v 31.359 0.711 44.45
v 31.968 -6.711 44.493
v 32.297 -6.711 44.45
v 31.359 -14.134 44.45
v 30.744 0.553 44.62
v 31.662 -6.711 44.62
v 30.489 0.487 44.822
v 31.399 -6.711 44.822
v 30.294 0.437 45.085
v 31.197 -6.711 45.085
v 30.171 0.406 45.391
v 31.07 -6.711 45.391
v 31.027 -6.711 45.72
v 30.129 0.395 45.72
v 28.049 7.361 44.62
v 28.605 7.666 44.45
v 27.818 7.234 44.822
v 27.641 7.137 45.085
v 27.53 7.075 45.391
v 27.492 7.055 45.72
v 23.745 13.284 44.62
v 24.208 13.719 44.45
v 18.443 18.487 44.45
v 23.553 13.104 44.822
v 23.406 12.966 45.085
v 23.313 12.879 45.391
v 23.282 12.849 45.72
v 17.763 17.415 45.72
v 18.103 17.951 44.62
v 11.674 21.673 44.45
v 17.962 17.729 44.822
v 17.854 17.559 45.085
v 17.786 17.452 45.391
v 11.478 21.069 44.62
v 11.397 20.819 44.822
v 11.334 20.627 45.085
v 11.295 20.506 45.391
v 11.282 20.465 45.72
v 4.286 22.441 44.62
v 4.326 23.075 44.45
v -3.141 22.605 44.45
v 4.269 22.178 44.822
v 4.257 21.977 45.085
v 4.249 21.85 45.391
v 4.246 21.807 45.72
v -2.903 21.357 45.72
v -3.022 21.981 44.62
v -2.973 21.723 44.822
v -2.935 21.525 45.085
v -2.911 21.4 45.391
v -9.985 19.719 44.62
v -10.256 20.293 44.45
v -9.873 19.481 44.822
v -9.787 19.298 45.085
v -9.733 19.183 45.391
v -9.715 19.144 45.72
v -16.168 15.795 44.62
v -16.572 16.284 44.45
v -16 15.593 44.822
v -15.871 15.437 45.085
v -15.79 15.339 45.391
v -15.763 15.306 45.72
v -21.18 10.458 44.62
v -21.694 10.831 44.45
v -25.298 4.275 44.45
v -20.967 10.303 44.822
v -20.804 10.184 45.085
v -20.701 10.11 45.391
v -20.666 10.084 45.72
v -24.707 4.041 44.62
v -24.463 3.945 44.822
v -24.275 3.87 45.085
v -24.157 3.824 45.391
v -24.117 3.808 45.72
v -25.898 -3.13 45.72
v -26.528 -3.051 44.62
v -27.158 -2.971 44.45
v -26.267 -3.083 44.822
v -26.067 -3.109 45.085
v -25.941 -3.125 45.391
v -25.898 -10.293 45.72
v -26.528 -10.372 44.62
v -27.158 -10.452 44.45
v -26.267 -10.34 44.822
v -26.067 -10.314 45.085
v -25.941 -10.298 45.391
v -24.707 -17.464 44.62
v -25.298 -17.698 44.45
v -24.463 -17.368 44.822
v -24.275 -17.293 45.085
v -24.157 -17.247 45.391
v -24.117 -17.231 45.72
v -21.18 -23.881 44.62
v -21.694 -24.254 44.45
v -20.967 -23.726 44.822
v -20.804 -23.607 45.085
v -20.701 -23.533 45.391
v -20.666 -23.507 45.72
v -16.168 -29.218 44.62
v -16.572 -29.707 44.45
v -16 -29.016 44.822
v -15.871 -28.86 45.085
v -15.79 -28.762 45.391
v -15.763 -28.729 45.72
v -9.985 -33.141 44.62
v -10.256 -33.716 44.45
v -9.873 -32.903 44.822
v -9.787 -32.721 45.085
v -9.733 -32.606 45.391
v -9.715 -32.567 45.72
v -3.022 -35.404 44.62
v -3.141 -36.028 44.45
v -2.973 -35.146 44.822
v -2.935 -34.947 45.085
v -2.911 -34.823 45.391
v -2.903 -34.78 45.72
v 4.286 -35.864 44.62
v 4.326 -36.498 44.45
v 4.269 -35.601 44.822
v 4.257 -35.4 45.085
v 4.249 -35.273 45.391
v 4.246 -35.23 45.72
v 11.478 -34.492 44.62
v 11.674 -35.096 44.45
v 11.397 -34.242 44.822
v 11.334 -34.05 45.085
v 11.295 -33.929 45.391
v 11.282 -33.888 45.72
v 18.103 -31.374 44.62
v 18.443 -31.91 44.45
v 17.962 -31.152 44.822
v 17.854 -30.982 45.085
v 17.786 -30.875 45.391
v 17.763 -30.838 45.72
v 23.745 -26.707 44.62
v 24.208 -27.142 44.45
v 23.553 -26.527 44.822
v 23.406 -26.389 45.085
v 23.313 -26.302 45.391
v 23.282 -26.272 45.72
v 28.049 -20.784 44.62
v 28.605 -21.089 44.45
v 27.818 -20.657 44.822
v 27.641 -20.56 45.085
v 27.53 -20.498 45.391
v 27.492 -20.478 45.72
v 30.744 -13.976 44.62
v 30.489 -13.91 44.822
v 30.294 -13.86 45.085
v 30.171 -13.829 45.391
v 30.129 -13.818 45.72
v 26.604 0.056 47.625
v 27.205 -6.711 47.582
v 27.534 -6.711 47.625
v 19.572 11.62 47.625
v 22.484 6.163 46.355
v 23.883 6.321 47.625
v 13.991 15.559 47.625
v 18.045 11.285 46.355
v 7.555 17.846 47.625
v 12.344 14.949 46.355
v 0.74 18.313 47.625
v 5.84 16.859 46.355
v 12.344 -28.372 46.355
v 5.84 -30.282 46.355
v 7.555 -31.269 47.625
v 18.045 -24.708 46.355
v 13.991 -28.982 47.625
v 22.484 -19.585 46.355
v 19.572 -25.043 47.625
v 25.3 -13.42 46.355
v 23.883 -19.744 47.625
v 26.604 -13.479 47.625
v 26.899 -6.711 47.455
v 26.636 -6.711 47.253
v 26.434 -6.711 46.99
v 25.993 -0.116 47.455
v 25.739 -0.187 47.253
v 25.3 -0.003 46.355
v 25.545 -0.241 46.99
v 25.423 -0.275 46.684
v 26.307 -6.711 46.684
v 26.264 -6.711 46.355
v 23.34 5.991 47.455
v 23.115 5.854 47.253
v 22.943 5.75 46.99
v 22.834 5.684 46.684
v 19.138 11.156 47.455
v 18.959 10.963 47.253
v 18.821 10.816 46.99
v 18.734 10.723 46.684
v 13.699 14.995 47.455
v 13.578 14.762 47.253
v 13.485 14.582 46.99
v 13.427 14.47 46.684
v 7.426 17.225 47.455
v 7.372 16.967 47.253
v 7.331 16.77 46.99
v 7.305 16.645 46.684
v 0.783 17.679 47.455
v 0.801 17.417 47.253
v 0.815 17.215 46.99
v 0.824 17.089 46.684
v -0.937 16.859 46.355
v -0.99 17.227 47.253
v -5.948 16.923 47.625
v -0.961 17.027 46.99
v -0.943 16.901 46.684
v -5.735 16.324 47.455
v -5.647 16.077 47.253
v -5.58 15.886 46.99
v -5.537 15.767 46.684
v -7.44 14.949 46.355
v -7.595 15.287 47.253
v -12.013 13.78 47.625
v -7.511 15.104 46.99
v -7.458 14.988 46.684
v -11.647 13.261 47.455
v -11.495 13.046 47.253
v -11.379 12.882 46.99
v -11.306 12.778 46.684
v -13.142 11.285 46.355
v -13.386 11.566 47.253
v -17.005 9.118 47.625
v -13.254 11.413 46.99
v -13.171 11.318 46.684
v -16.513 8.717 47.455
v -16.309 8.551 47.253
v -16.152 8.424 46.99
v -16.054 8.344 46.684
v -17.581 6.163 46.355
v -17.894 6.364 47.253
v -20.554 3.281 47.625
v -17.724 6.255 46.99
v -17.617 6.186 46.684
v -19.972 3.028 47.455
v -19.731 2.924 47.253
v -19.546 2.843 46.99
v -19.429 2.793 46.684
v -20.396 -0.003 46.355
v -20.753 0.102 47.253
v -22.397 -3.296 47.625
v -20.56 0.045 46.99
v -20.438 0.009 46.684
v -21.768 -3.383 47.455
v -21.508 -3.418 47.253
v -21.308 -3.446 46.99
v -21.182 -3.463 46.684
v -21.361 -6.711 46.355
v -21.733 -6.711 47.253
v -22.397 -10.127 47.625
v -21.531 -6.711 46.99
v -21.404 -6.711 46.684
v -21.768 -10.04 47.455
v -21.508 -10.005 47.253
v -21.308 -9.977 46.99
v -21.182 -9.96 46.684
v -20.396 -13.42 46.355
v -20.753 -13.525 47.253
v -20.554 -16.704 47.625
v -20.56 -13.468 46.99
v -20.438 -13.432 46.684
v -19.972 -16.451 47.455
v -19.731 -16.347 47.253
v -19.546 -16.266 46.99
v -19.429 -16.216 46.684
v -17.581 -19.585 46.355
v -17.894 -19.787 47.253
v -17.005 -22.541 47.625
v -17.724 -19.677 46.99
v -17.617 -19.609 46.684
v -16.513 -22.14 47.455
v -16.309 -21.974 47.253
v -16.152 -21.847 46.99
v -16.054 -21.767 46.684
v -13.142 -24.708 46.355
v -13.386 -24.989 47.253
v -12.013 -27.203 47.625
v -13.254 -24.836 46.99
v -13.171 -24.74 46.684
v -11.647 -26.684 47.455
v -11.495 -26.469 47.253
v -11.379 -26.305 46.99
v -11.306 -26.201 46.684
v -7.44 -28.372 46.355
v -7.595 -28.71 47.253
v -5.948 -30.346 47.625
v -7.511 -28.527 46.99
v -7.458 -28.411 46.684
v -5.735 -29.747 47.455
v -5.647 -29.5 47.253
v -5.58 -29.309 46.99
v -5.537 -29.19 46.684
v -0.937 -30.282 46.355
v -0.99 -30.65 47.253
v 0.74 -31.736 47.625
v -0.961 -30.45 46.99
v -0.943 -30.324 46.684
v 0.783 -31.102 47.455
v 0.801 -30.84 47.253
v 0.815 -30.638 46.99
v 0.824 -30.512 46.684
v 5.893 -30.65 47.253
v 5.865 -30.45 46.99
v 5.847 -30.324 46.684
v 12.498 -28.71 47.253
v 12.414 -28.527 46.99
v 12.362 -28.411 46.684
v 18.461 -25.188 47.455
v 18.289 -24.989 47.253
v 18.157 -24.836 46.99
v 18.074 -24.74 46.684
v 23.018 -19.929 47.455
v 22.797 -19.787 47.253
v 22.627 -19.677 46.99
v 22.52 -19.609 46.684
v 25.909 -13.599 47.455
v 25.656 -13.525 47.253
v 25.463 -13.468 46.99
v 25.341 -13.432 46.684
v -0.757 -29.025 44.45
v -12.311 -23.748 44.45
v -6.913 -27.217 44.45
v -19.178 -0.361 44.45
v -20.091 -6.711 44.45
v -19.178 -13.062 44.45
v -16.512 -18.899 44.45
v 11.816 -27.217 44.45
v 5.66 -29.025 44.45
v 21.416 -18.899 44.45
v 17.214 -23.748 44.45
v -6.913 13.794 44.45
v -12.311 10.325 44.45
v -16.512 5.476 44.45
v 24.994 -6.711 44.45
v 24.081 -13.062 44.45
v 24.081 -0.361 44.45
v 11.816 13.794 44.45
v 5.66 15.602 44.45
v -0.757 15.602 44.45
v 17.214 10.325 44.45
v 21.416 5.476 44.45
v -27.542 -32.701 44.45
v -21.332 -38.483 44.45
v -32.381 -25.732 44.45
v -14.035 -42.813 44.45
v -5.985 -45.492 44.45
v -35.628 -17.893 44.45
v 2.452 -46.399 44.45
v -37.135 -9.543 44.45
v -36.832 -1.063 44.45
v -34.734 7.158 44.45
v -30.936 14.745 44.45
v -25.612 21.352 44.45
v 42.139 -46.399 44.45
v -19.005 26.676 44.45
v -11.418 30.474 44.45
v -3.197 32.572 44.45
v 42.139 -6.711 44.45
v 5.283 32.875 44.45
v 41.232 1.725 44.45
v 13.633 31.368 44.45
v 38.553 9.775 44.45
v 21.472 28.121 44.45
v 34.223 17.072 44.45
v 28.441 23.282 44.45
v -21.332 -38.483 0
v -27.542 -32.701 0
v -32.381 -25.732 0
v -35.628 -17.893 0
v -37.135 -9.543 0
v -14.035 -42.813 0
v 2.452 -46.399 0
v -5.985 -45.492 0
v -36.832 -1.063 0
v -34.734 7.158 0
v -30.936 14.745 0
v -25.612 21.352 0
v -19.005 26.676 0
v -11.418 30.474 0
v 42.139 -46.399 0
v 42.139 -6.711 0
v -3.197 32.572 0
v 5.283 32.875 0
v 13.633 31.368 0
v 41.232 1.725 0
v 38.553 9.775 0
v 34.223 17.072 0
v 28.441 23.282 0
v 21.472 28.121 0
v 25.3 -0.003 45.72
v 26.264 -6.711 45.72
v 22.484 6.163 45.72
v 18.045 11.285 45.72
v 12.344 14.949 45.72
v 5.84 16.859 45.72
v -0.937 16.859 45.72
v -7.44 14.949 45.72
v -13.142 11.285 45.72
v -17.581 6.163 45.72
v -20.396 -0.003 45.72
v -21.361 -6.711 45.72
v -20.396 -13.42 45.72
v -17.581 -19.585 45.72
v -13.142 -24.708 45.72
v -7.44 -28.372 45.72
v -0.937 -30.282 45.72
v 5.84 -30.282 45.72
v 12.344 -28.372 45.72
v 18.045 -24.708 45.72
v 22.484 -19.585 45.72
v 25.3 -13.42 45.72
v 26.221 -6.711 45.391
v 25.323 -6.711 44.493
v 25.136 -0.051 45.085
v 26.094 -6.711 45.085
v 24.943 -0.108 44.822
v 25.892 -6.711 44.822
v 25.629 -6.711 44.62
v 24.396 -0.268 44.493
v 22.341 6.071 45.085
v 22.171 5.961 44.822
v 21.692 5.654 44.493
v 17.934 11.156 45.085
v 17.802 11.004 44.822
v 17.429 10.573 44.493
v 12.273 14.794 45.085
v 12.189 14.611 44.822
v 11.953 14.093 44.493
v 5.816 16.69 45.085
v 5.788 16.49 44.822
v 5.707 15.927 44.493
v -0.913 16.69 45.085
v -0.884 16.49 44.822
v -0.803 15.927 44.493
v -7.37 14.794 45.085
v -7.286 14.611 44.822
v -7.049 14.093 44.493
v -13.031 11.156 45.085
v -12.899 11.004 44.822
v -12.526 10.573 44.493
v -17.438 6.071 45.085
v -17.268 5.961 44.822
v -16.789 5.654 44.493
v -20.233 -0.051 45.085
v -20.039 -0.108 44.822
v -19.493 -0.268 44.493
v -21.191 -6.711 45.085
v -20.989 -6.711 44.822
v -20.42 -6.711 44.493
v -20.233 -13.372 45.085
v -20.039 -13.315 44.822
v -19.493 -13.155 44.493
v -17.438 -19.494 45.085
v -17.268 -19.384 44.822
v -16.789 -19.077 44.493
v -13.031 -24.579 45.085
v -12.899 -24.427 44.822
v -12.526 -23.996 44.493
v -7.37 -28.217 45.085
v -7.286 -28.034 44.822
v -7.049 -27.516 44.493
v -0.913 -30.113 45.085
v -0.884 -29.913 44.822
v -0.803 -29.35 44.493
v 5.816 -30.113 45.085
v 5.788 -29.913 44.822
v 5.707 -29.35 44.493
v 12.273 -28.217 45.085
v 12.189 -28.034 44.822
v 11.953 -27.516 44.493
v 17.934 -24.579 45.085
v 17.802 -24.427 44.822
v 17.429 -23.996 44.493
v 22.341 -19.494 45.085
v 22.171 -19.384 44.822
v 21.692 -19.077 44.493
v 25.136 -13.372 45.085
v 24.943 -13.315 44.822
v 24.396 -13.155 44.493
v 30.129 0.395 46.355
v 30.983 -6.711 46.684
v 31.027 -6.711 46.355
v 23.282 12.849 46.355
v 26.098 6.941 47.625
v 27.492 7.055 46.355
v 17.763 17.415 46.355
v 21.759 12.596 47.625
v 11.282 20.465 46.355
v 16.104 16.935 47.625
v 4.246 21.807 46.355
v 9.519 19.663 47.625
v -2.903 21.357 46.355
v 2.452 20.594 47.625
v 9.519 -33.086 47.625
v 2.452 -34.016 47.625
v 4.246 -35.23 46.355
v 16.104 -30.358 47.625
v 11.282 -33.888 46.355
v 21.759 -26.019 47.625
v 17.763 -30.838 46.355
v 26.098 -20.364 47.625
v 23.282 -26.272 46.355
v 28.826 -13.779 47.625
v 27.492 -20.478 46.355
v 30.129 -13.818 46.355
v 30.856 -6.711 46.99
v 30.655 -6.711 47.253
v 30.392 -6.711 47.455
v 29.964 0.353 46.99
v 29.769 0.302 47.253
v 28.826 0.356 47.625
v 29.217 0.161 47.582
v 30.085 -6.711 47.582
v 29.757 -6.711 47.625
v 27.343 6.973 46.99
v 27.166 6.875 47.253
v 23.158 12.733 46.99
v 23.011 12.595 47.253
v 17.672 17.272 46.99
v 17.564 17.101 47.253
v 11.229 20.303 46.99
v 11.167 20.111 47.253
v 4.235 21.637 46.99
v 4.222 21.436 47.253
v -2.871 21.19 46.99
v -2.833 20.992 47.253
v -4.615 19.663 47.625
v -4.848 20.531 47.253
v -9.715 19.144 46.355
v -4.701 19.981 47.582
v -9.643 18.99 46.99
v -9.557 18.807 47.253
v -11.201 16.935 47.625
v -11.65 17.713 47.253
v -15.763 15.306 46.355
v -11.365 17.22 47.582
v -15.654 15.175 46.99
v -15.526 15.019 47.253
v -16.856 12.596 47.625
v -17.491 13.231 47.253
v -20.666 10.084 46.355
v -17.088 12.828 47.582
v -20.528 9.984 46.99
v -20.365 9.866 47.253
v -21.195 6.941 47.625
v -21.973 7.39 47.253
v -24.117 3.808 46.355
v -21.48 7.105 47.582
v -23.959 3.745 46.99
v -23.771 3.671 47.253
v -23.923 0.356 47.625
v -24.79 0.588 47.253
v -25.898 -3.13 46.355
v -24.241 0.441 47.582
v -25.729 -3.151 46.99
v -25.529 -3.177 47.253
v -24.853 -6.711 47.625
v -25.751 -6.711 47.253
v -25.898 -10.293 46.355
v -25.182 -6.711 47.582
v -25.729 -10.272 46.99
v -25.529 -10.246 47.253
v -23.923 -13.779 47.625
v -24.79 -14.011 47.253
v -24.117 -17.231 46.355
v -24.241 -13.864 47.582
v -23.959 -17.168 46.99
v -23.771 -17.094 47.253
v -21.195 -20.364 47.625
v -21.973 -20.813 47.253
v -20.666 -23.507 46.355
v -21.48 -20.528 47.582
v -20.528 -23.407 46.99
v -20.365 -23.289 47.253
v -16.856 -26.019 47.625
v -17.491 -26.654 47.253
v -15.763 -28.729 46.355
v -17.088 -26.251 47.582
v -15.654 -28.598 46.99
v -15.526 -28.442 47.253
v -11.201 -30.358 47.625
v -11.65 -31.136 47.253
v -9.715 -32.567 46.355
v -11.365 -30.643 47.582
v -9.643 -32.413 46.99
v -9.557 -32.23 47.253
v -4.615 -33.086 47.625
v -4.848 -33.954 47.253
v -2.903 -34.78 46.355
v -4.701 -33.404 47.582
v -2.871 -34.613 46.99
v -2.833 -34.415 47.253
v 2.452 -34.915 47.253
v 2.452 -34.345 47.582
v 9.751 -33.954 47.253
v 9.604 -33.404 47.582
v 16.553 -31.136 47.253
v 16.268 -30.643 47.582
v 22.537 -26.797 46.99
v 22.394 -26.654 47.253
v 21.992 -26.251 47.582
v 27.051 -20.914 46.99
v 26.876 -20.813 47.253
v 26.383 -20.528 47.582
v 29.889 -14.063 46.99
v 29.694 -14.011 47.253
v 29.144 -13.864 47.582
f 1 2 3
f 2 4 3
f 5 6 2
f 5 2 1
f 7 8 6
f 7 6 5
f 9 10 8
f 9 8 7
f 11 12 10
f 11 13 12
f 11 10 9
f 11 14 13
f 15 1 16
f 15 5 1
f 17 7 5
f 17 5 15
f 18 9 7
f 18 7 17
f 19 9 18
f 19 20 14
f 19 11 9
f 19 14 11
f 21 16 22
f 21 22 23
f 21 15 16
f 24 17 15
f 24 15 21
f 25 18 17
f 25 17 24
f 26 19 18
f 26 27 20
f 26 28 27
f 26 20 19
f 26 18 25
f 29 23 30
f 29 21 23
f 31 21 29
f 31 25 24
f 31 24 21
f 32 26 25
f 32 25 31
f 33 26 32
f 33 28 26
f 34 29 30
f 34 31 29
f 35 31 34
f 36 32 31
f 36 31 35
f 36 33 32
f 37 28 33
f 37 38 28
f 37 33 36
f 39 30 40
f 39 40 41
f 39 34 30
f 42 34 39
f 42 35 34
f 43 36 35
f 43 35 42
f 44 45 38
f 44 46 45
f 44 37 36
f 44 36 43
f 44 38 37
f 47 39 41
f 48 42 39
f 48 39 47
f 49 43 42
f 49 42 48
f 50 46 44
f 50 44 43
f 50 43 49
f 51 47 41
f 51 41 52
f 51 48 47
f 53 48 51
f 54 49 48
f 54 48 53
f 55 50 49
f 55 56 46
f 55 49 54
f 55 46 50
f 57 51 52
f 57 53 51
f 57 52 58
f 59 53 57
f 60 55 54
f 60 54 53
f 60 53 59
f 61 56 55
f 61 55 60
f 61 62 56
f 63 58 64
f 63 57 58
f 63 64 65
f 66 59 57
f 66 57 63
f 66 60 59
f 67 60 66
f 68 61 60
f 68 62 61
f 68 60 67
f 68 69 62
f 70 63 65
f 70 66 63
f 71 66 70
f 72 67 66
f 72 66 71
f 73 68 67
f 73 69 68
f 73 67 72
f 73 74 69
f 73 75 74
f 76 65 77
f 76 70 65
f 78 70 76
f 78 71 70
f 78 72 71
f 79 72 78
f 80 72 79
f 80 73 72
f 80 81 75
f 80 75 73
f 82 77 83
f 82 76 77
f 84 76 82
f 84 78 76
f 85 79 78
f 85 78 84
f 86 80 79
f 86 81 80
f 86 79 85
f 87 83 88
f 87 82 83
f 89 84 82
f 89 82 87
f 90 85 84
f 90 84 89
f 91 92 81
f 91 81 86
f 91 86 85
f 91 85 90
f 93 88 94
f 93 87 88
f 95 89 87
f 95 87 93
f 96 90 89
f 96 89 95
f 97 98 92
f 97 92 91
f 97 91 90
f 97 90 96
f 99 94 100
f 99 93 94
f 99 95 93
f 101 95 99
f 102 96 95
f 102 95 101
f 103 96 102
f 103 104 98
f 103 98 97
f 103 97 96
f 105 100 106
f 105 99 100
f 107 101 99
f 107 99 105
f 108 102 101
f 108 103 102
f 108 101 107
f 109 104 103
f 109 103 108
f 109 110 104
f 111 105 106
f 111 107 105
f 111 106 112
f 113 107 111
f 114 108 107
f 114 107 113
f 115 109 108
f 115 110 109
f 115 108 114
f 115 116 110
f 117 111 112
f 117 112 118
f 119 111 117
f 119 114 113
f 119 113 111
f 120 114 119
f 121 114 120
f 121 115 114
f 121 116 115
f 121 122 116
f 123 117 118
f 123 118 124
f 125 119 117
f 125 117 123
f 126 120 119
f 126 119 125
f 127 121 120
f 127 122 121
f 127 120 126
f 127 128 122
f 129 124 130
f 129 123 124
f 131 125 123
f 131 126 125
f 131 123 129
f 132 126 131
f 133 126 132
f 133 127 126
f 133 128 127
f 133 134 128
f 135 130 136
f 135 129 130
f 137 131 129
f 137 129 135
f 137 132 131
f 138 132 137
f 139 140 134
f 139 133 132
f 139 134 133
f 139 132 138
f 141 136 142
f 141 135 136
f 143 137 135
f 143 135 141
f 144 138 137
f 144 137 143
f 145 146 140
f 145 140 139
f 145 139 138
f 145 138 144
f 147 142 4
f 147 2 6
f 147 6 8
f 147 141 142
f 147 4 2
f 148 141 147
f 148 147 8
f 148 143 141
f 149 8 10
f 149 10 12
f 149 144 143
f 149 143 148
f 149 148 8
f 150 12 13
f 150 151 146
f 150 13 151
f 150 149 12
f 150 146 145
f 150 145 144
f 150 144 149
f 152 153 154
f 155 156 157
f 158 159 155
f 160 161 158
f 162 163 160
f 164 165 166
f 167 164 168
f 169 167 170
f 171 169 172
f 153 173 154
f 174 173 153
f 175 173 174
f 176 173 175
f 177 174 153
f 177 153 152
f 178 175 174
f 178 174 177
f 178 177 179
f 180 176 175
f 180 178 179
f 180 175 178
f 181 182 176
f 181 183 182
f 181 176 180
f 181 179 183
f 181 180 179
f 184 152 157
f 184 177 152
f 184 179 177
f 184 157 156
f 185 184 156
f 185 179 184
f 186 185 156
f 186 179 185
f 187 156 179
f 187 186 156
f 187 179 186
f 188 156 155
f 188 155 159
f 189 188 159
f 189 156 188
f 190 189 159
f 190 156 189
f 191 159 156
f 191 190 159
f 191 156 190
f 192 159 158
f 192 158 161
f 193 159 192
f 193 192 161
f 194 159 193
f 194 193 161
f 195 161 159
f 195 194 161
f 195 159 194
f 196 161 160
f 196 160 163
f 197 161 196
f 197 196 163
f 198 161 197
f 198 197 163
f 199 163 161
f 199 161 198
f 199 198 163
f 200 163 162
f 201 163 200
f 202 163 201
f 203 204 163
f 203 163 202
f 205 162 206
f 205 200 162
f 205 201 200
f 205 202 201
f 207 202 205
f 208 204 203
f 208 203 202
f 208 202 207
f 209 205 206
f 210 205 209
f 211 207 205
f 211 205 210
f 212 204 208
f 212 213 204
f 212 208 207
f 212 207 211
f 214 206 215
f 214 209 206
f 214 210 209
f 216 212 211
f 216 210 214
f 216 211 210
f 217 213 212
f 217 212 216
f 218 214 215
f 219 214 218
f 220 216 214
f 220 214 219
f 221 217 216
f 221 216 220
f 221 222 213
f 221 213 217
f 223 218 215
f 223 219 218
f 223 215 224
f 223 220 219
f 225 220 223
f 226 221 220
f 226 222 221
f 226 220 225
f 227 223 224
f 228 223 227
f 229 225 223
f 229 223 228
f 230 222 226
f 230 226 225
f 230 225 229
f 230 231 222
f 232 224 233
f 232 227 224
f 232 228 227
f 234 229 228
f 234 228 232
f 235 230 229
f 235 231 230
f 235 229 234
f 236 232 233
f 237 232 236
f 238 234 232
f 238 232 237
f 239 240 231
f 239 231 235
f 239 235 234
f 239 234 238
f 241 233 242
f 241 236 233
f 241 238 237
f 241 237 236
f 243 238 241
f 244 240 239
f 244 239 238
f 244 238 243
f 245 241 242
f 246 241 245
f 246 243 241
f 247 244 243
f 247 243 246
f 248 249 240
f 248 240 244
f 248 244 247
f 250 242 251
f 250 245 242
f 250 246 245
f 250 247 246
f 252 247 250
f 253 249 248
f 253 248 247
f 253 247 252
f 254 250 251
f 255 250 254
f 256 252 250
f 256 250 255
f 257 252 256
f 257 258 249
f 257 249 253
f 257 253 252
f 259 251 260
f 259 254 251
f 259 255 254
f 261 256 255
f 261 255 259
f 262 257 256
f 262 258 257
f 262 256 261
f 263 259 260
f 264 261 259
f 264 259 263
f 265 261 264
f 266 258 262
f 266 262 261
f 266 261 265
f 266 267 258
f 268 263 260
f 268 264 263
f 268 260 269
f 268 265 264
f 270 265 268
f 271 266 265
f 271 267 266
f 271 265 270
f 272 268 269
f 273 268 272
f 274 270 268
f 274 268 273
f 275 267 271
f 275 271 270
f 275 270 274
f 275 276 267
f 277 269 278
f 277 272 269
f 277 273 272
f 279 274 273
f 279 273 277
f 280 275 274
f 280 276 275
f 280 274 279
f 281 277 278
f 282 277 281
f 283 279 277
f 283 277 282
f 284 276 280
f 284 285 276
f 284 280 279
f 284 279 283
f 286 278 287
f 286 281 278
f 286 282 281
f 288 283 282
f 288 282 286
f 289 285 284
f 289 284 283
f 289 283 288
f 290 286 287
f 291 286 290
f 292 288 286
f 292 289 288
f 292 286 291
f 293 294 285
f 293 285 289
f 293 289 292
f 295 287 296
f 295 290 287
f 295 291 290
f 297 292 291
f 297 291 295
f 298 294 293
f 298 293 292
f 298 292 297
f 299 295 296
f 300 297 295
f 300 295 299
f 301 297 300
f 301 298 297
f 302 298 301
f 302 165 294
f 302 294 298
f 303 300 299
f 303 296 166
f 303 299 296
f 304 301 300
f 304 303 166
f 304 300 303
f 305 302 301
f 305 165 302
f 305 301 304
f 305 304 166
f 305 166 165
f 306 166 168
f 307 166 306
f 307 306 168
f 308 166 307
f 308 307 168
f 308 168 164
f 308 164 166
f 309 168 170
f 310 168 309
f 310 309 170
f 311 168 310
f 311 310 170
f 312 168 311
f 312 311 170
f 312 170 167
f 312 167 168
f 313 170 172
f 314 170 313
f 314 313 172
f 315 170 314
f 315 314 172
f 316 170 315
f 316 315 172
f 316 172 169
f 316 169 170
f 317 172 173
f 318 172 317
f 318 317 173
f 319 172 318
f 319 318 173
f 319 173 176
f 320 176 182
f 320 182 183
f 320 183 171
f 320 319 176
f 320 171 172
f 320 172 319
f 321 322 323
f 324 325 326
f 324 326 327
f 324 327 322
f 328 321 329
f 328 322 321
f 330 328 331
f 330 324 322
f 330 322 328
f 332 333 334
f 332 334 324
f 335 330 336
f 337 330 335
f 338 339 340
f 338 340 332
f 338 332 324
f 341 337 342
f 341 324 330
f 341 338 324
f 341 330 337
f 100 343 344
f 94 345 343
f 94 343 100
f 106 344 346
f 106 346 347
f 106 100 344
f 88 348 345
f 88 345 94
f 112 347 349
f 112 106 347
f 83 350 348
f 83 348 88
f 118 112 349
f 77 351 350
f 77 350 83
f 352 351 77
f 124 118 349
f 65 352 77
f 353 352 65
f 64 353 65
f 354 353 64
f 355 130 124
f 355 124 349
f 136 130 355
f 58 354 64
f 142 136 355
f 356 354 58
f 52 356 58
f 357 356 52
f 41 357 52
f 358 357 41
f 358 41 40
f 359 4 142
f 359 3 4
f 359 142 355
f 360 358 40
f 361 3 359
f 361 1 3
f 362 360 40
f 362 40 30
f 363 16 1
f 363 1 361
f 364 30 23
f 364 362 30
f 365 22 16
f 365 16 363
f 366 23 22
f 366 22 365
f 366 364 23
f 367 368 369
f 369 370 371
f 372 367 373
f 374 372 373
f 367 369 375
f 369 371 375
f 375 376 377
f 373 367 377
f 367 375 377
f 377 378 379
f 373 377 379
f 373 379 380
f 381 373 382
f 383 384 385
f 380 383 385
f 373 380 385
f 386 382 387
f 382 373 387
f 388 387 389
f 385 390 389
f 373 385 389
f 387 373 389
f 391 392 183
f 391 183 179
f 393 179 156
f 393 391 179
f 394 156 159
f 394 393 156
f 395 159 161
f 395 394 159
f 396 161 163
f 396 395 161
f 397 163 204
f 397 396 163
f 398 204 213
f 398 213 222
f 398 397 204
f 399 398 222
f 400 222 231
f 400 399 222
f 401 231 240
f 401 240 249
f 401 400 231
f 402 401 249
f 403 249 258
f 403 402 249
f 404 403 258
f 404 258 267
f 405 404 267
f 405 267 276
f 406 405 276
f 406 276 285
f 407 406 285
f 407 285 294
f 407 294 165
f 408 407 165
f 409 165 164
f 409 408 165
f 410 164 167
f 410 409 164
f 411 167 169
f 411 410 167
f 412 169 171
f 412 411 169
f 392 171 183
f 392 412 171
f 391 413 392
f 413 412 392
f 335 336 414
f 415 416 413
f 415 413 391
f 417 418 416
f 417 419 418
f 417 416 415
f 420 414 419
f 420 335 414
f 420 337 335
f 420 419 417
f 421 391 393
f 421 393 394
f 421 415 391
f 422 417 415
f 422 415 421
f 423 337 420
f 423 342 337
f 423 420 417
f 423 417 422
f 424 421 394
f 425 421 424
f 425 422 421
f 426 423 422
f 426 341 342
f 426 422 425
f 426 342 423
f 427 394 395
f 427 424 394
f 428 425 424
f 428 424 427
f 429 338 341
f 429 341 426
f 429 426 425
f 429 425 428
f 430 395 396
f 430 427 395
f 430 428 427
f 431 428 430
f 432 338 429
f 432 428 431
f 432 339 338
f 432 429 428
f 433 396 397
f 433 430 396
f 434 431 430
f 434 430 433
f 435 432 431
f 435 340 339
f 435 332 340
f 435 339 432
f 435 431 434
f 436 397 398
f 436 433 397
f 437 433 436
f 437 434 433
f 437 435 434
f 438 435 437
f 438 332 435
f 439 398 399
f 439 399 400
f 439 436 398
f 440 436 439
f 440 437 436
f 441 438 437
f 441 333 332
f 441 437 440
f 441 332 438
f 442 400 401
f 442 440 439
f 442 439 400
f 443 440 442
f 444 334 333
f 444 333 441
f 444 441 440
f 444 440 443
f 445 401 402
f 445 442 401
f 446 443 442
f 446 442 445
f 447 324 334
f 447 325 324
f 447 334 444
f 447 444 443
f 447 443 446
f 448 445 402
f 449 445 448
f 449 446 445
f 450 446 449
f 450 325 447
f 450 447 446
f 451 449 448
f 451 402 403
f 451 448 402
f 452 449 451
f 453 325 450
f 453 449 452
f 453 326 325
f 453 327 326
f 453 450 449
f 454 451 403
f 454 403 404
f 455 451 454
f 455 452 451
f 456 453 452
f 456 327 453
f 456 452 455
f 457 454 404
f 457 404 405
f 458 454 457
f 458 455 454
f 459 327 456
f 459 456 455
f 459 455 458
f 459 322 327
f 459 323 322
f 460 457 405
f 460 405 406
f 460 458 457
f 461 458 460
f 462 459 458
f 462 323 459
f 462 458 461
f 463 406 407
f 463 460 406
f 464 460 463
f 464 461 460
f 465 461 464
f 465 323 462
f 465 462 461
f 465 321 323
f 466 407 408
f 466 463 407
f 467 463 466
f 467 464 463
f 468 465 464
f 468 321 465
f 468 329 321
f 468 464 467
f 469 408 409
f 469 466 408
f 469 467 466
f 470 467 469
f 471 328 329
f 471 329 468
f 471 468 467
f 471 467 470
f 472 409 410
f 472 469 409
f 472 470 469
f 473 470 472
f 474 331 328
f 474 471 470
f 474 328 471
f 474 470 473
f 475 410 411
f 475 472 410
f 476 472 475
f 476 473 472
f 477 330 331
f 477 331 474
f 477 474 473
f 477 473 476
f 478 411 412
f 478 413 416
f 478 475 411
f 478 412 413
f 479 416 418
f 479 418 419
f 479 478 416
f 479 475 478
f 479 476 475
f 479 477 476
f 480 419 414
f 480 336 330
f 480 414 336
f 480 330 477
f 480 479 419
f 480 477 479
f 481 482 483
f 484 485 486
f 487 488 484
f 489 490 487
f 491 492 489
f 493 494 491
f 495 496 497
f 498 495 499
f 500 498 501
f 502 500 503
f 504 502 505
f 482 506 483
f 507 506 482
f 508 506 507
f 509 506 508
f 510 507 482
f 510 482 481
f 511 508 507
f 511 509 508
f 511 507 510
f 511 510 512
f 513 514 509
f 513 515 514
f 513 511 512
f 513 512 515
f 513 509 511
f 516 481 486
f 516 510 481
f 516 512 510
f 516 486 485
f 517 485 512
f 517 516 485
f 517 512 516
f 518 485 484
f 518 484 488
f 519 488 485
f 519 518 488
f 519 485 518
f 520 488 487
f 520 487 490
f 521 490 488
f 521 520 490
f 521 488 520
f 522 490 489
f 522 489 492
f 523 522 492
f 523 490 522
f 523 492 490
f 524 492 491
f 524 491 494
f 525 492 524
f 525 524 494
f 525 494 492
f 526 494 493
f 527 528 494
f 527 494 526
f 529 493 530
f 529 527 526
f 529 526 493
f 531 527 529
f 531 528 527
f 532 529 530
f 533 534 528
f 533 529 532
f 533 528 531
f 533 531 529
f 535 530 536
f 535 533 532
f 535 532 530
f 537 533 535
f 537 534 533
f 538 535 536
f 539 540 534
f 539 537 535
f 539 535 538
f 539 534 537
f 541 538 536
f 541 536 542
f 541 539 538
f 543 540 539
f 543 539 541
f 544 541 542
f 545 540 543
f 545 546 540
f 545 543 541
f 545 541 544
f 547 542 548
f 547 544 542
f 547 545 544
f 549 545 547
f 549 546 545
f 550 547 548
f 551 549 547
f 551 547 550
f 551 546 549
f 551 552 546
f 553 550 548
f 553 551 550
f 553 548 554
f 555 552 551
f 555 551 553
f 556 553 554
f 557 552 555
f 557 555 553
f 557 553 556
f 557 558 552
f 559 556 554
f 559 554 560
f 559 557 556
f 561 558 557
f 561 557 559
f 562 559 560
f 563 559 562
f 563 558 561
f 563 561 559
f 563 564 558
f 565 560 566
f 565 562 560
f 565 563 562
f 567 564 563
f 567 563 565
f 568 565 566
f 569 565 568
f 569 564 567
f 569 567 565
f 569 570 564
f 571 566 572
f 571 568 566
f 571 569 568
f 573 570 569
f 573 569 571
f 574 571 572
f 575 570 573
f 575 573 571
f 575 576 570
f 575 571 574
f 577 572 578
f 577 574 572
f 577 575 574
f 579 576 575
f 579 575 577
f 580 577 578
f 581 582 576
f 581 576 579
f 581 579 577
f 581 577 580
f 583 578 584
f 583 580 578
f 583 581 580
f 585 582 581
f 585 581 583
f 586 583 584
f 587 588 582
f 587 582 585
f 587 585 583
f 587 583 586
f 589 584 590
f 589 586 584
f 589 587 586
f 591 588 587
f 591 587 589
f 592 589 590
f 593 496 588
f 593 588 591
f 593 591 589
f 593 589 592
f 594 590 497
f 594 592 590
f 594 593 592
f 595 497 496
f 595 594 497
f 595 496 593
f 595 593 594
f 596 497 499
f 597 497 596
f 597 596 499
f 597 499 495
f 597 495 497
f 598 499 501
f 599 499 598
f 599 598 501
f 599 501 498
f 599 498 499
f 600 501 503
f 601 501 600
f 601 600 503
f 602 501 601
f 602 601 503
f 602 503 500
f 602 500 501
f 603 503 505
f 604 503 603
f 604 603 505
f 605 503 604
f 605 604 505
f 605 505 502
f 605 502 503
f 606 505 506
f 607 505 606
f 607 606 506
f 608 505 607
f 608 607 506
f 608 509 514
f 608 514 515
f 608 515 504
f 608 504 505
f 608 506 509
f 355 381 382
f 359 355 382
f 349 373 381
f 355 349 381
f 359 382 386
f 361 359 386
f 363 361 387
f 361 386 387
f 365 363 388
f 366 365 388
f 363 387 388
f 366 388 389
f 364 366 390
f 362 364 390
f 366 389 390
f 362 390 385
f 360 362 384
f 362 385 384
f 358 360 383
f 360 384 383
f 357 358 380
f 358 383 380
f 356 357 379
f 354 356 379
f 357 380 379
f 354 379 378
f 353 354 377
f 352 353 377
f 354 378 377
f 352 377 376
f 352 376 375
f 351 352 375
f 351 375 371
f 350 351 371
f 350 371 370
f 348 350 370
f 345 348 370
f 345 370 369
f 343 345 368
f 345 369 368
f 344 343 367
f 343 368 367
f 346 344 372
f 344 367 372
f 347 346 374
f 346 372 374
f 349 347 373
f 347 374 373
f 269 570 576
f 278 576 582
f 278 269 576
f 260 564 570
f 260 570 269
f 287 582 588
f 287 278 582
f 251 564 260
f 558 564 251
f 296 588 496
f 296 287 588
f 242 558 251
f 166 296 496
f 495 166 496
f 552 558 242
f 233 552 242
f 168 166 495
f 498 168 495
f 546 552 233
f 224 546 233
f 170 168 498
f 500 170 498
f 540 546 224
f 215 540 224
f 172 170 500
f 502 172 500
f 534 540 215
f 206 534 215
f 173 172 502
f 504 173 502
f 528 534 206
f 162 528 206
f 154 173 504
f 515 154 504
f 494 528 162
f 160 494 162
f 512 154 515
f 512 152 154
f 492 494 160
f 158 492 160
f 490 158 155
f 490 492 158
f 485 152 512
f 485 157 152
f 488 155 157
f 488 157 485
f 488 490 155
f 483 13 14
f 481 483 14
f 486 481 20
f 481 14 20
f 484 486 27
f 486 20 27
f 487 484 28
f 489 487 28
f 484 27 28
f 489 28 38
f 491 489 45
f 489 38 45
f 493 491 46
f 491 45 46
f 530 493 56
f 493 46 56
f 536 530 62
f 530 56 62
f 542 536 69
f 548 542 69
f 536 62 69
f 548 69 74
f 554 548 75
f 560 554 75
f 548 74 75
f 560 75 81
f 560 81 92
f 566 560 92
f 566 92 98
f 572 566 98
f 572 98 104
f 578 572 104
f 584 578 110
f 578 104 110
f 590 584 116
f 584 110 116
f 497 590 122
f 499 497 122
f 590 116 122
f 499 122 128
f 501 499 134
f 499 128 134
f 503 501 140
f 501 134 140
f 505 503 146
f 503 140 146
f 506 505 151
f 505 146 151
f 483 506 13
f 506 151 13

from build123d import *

# Parameters (mm, degrees)
F1_DEPTH = 44.45
F2_R     = 28.575
F2_R_2   = 23.8125
F3_DEPTH = 3.175
F4_R     = 1.27


with BuildPart() as f1:
    # F0 (on Top) → F1 (new body)
    with BuildSketch(Plane.XY):
        with BuildLine():
            Line((42.139101, -46.398989), (42.139101, -6.711489))
            ThreePointArc((42.139101, -6.711489), (30.514902, -34.774789), (2.451601, -46.398989))
            Line((2.451601, -46.398989), (42.139101, -46.398989))
        make_face()
        with BuildLine():
            ThreePointArc((2.451601, -46.398989), (30.514902, -34.774789), (42.139101, -6.711489))
            ThreePointArc((42.139101, -6.711489), (-25.611699, 21.351812), (2.451601, -46.398989))
        make_face()
    extrude(amount=F1_DEPTH)

    # F2 (on face) → F3 (join)
    with BuildSketch(Plane.XY.offset(44.45)):
        with Locations((2.451601, -6.711489)):
            Circle(F2_R)
        with Locations((2.451601, -6.711489)):
            Circle(F2_R_2, mode=Mode.SUBTRACT)
    extrude(amount=F3_DEPTH)

    # F4
    f4_edges = [f1.edges().sort_by_distance(p)[0] for p in [
        (-26.123399, -6.711489, 47.625),
        (-21.360899, -6.711489, 47.625),
        (-26.123399, -6.711489, 44.45),
        (-21.360899, -6.711489, 44.45),
    ]]
    fillet(f4_edges, radius=F4_R)


solid = f1.part
